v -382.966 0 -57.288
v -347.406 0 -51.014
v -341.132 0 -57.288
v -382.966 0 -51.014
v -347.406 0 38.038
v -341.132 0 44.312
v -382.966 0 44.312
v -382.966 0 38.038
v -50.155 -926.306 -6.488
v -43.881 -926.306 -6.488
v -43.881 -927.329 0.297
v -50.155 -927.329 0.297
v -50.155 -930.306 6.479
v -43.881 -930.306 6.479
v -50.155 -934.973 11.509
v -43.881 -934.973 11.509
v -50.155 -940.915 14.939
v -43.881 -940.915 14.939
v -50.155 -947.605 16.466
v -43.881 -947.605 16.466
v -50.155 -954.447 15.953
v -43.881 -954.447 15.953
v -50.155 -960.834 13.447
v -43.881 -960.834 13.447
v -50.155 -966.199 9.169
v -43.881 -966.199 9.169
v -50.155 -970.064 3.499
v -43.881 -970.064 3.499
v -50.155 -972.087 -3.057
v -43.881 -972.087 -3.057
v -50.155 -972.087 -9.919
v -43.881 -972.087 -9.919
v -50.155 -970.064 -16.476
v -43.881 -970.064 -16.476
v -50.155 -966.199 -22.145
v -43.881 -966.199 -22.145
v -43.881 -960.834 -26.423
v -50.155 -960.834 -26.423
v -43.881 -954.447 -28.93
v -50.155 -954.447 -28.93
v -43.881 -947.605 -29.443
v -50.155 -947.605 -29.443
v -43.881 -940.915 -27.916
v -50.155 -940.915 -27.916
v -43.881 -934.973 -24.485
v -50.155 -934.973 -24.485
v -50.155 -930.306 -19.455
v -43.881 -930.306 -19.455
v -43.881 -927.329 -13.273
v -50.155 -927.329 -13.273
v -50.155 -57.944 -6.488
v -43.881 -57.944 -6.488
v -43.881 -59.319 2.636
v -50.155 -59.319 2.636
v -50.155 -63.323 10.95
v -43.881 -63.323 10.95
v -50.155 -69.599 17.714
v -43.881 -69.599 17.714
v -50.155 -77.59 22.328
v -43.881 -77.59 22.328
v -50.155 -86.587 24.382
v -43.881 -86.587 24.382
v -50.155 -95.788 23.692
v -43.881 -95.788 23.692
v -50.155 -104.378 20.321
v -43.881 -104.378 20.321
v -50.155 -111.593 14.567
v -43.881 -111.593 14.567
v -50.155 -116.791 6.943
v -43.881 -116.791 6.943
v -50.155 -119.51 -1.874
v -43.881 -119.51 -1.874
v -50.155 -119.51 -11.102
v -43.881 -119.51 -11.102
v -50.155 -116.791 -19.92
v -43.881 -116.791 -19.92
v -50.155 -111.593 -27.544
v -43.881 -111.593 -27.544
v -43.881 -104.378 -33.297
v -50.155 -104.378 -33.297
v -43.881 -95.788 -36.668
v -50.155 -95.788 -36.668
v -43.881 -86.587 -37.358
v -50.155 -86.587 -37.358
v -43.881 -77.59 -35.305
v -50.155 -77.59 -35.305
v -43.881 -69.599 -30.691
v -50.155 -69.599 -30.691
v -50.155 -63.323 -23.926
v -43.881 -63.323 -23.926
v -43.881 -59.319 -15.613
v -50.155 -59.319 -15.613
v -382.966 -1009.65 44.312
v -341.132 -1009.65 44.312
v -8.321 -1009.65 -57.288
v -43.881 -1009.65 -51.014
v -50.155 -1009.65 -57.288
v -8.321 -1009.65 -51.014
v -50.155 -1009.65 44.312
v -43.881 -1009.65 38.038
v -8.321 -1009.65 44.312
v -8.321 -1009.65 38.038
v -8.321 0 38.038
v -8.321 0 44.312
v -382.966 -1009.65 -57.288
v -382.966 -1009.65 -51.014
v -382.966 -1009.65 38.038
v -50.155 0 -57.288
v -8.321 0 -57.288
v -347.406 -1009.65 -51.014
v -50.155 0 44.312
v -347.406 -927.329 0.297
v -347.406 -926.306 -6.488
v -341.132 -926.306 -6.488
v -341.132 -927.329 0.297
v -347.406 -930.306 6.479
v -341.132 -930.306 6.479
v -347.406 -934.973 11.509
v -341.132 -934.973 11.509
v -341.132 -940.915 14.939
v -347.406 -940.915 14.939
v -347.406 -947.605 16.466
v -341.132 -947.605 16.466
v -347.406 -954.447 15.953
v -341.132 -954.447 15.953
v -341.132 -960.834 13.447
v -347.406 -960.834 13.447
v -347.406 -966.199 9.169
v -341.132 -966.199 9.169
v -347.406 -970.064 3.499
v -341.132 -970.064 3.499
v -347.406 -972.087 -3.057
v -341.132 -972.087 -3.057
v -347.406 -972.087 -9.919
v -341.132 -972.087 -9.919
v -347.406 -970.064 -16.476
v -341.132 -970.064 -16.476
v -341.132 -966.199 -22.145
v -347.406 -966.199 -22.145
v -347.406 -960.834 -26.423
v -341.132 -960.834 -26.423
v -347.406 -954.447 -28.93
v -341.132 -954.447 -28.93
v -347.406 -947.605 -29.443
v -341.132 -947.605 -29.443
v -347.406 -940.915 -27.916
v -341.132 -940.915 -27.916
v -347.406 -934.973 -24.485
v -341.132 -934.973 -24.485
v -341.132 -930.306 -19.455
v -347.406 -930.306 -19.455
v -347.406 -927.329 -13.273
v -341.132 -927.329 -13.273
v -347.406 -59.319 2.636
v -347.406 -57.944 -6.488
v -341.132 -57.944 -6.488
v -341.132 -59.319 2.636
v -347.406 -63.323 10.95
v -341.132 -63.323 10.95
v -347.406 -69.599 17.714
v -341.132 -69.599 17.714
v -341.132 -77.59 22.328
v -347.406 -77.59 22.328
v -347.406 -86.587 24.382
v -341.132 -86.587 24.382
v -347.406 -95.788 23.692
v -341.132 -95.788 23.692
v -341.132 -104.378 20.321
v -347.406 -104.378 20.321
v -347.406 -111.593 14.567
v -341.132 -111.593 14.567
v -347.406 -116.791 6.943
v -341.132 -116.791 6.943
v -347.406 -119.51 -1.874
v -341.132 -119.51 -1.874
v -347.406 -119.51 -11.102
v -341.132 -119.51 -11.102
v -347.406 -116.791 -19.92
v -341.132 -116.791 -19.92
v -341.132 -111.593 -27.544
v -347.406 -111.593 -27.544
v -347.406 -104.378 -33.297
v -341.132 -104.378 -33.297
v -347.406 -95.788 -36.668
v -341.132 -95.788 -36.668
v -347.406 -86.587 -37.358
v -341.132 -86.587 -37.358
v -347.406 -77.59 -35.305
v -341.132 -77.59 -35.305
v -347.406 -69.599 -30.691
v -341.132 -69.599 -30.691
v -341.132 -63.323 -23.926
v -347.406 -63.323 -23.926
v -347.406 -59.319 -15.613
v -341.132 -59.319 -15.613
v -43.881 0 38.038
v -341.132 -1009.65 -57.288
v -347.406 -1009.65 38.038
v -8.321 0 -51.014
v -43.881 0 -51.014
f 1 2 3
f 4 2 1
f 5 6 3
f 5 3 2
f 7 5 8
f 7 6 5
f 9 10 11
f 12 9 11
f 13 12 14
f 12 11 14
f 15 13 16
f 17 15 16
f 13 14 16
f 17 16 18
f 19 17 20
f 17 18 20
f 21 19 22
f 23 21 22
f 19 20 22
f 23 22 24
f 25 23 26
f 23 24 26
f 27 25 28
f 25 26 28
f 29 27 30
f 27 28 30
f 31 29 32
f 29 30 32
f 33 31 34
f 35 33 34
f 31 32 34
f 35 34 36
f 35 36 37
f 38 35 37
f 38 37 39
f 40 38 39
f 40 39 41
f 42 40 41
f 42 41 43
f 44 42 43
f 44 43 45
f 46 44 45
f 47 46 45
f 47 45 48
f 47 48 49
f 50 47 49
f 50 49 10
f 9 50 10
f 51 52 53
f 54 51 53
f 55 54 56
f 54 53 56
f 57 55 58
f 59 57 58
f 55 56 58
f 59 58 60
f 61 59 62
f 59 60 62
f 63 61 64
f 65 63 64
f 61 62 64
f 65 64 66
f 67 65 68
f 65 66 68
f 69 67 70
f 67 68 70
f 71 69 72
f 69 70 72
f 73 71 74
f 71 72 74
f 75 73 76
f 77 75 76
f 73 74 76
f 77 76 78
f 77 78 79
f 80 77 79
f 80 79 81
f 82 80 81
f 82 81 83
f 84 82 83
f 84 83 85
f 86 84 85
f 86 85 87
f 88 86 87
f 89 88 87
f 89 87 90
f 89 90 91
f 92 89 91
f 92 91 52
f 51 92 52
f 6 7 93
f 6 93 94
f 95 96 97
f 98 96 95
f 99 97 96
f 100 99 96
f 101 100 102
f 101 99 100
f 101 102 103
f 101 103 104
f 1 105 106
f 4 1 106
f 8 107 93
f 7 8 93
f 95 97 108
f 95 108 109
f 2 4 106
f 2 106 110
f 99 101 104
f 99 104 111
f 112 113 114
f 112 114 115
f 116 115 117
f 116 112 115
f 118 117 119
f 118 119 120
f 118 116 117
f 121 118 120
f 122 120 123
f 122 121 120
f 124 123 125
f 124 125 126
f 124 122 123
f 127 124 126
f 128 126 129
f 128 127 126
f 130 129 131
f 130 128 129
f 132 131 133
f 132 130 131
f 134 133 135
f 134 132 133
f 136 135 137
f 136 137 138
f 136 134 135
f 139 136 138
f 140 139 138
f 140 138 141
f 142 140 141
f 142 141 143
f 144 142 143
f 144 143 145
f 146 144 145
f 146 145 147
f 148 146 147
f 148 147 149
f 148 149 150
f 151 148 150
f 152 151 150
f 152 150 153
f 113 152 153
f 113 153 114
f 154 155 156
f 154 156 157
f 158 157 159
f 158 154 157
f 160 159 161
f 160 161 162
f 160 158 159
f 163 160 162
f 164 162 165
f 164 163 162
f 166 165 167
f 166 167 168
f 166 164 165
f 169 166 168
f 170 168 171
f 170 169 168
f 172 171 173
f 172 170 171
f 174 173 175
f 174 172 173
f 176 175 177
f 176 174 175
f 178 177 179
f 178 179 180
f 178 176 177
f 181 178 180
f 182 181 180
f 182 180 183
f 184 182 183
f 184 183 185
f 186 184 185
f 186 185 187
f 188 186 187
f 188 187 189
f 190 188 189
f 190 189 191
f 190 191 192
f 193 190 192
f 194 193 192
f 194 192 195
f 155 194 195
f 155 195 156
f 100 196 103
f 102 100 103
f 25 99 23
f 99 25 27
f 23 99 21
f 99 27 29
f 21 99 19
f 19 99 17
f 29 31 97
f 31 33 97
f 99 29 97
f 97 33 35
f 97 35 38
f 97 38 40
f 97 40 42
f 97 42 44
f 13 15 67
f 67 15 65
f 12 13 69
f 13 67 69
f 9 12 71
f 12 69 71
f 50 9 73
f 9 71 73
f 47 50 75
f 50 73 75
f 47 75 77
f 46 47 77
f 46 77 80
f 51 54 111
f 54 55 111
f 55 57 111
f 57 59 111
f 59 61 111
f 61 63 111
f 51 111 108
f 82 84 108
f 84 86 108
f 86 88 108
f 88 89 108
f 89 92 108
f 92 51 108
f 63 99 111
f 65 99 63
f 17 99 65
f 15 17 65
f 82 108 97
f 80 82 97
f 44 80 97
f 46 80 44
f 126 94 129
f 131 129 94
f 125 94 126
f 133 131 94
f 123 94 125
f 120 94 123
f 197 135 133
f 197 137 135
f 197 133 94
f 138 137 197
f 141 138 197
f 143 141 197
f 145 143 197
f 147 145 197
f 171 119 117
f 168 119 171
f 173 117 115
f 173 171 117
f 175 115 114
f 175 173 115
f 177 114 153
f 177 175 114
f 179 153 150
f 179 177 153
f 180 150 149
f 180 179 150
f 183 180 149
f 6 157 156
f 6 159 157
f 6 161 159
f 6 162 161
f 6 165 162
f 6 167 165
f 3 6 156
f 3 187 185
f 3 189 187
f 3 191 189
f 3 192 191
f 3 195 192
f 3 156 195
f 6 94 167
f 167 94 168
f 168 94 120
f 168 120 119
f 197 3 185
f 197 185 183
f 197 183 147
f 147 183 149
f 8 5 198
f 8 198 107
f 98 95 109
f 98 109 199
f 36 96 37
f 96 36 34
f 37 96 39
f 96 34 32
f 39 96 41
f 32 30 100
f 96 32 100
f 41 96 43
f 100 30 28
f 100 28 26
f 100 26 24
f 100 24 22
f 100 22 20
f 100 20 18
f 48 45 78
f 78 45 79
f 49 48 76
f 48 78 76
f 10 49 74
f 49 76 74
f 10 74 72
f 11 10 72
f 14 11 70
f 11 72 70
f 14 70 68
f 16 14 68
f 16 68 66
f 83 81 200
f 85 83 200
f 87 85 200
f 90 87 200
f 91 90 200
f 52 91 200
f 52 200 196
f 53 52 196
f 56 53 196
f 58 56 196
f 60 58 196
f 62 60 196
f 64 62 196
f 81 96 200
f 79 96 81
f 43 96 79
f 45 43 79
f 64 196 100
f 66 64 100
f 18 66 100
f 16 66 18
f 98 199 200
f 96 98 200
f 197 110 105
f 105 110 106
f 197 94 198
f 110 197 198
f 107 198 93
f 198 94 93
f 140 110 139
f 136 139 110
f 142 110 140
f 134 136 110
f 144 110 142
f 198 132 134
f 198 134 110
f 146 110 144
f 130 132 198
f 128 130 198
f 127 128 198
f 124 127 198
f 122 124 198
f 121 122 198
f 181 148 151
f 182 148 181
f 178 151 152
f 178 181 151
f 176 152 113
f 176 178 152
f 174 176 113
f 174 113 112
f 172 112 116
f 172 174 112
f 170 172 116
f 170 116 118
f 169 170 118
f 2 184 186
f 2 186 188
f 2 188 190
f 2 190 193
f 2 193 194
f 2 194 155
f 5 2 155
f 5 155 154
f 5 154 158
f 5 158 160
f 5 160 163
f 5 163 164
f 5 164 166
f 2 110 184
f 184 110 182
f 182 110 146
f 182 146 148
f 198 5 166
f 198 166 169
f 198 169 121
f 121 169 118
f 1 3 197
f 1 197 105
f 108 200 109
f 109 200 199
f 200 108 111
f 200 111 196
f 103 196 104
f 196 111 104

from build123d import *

# Parameters (mm, degrees)
F1_DEPTH = 1009.65
F2_R     = 30.95625
F2_R_2   = 23.01875
F3_DEPTH = 25.4


with BuildPart() as f1:
    # F0 (on Front) → F1 (new body)
    with BuildSketch(Plane.XZ):
        Polygon((-8.32118, 44.31186), (-50.15498, 44.31186), (-50.15498, -57.28814), (-8.32118, -57.28814), (-8.32118, -51.01434), (-43.88118, -51.01434), (-43.88118, 38.03806), (-8.32118, 38.03806), align=None)
    extrude(amount=F1_DEPTH)

    # F2 (on face) → F3 (cut)
    with BuildSketch(Plane.YZ.offset(-43.88118)):
        with Locations((-88.9, -6.48814)):
            Circle(F2_R)
        with Locations((-949.325, -6.48814)):
            Circle(F2_R_2)
    extrude(amount=-F3_DEPTH, mode=Mode.SUBTRACT)


with BuildPart() as f5_1:
    # F5: instance of F1
    add(f1.part.mirror(Plane.YZ.offset(-195.6435)))


solid = Compound([f1.part, f5_1.part])
